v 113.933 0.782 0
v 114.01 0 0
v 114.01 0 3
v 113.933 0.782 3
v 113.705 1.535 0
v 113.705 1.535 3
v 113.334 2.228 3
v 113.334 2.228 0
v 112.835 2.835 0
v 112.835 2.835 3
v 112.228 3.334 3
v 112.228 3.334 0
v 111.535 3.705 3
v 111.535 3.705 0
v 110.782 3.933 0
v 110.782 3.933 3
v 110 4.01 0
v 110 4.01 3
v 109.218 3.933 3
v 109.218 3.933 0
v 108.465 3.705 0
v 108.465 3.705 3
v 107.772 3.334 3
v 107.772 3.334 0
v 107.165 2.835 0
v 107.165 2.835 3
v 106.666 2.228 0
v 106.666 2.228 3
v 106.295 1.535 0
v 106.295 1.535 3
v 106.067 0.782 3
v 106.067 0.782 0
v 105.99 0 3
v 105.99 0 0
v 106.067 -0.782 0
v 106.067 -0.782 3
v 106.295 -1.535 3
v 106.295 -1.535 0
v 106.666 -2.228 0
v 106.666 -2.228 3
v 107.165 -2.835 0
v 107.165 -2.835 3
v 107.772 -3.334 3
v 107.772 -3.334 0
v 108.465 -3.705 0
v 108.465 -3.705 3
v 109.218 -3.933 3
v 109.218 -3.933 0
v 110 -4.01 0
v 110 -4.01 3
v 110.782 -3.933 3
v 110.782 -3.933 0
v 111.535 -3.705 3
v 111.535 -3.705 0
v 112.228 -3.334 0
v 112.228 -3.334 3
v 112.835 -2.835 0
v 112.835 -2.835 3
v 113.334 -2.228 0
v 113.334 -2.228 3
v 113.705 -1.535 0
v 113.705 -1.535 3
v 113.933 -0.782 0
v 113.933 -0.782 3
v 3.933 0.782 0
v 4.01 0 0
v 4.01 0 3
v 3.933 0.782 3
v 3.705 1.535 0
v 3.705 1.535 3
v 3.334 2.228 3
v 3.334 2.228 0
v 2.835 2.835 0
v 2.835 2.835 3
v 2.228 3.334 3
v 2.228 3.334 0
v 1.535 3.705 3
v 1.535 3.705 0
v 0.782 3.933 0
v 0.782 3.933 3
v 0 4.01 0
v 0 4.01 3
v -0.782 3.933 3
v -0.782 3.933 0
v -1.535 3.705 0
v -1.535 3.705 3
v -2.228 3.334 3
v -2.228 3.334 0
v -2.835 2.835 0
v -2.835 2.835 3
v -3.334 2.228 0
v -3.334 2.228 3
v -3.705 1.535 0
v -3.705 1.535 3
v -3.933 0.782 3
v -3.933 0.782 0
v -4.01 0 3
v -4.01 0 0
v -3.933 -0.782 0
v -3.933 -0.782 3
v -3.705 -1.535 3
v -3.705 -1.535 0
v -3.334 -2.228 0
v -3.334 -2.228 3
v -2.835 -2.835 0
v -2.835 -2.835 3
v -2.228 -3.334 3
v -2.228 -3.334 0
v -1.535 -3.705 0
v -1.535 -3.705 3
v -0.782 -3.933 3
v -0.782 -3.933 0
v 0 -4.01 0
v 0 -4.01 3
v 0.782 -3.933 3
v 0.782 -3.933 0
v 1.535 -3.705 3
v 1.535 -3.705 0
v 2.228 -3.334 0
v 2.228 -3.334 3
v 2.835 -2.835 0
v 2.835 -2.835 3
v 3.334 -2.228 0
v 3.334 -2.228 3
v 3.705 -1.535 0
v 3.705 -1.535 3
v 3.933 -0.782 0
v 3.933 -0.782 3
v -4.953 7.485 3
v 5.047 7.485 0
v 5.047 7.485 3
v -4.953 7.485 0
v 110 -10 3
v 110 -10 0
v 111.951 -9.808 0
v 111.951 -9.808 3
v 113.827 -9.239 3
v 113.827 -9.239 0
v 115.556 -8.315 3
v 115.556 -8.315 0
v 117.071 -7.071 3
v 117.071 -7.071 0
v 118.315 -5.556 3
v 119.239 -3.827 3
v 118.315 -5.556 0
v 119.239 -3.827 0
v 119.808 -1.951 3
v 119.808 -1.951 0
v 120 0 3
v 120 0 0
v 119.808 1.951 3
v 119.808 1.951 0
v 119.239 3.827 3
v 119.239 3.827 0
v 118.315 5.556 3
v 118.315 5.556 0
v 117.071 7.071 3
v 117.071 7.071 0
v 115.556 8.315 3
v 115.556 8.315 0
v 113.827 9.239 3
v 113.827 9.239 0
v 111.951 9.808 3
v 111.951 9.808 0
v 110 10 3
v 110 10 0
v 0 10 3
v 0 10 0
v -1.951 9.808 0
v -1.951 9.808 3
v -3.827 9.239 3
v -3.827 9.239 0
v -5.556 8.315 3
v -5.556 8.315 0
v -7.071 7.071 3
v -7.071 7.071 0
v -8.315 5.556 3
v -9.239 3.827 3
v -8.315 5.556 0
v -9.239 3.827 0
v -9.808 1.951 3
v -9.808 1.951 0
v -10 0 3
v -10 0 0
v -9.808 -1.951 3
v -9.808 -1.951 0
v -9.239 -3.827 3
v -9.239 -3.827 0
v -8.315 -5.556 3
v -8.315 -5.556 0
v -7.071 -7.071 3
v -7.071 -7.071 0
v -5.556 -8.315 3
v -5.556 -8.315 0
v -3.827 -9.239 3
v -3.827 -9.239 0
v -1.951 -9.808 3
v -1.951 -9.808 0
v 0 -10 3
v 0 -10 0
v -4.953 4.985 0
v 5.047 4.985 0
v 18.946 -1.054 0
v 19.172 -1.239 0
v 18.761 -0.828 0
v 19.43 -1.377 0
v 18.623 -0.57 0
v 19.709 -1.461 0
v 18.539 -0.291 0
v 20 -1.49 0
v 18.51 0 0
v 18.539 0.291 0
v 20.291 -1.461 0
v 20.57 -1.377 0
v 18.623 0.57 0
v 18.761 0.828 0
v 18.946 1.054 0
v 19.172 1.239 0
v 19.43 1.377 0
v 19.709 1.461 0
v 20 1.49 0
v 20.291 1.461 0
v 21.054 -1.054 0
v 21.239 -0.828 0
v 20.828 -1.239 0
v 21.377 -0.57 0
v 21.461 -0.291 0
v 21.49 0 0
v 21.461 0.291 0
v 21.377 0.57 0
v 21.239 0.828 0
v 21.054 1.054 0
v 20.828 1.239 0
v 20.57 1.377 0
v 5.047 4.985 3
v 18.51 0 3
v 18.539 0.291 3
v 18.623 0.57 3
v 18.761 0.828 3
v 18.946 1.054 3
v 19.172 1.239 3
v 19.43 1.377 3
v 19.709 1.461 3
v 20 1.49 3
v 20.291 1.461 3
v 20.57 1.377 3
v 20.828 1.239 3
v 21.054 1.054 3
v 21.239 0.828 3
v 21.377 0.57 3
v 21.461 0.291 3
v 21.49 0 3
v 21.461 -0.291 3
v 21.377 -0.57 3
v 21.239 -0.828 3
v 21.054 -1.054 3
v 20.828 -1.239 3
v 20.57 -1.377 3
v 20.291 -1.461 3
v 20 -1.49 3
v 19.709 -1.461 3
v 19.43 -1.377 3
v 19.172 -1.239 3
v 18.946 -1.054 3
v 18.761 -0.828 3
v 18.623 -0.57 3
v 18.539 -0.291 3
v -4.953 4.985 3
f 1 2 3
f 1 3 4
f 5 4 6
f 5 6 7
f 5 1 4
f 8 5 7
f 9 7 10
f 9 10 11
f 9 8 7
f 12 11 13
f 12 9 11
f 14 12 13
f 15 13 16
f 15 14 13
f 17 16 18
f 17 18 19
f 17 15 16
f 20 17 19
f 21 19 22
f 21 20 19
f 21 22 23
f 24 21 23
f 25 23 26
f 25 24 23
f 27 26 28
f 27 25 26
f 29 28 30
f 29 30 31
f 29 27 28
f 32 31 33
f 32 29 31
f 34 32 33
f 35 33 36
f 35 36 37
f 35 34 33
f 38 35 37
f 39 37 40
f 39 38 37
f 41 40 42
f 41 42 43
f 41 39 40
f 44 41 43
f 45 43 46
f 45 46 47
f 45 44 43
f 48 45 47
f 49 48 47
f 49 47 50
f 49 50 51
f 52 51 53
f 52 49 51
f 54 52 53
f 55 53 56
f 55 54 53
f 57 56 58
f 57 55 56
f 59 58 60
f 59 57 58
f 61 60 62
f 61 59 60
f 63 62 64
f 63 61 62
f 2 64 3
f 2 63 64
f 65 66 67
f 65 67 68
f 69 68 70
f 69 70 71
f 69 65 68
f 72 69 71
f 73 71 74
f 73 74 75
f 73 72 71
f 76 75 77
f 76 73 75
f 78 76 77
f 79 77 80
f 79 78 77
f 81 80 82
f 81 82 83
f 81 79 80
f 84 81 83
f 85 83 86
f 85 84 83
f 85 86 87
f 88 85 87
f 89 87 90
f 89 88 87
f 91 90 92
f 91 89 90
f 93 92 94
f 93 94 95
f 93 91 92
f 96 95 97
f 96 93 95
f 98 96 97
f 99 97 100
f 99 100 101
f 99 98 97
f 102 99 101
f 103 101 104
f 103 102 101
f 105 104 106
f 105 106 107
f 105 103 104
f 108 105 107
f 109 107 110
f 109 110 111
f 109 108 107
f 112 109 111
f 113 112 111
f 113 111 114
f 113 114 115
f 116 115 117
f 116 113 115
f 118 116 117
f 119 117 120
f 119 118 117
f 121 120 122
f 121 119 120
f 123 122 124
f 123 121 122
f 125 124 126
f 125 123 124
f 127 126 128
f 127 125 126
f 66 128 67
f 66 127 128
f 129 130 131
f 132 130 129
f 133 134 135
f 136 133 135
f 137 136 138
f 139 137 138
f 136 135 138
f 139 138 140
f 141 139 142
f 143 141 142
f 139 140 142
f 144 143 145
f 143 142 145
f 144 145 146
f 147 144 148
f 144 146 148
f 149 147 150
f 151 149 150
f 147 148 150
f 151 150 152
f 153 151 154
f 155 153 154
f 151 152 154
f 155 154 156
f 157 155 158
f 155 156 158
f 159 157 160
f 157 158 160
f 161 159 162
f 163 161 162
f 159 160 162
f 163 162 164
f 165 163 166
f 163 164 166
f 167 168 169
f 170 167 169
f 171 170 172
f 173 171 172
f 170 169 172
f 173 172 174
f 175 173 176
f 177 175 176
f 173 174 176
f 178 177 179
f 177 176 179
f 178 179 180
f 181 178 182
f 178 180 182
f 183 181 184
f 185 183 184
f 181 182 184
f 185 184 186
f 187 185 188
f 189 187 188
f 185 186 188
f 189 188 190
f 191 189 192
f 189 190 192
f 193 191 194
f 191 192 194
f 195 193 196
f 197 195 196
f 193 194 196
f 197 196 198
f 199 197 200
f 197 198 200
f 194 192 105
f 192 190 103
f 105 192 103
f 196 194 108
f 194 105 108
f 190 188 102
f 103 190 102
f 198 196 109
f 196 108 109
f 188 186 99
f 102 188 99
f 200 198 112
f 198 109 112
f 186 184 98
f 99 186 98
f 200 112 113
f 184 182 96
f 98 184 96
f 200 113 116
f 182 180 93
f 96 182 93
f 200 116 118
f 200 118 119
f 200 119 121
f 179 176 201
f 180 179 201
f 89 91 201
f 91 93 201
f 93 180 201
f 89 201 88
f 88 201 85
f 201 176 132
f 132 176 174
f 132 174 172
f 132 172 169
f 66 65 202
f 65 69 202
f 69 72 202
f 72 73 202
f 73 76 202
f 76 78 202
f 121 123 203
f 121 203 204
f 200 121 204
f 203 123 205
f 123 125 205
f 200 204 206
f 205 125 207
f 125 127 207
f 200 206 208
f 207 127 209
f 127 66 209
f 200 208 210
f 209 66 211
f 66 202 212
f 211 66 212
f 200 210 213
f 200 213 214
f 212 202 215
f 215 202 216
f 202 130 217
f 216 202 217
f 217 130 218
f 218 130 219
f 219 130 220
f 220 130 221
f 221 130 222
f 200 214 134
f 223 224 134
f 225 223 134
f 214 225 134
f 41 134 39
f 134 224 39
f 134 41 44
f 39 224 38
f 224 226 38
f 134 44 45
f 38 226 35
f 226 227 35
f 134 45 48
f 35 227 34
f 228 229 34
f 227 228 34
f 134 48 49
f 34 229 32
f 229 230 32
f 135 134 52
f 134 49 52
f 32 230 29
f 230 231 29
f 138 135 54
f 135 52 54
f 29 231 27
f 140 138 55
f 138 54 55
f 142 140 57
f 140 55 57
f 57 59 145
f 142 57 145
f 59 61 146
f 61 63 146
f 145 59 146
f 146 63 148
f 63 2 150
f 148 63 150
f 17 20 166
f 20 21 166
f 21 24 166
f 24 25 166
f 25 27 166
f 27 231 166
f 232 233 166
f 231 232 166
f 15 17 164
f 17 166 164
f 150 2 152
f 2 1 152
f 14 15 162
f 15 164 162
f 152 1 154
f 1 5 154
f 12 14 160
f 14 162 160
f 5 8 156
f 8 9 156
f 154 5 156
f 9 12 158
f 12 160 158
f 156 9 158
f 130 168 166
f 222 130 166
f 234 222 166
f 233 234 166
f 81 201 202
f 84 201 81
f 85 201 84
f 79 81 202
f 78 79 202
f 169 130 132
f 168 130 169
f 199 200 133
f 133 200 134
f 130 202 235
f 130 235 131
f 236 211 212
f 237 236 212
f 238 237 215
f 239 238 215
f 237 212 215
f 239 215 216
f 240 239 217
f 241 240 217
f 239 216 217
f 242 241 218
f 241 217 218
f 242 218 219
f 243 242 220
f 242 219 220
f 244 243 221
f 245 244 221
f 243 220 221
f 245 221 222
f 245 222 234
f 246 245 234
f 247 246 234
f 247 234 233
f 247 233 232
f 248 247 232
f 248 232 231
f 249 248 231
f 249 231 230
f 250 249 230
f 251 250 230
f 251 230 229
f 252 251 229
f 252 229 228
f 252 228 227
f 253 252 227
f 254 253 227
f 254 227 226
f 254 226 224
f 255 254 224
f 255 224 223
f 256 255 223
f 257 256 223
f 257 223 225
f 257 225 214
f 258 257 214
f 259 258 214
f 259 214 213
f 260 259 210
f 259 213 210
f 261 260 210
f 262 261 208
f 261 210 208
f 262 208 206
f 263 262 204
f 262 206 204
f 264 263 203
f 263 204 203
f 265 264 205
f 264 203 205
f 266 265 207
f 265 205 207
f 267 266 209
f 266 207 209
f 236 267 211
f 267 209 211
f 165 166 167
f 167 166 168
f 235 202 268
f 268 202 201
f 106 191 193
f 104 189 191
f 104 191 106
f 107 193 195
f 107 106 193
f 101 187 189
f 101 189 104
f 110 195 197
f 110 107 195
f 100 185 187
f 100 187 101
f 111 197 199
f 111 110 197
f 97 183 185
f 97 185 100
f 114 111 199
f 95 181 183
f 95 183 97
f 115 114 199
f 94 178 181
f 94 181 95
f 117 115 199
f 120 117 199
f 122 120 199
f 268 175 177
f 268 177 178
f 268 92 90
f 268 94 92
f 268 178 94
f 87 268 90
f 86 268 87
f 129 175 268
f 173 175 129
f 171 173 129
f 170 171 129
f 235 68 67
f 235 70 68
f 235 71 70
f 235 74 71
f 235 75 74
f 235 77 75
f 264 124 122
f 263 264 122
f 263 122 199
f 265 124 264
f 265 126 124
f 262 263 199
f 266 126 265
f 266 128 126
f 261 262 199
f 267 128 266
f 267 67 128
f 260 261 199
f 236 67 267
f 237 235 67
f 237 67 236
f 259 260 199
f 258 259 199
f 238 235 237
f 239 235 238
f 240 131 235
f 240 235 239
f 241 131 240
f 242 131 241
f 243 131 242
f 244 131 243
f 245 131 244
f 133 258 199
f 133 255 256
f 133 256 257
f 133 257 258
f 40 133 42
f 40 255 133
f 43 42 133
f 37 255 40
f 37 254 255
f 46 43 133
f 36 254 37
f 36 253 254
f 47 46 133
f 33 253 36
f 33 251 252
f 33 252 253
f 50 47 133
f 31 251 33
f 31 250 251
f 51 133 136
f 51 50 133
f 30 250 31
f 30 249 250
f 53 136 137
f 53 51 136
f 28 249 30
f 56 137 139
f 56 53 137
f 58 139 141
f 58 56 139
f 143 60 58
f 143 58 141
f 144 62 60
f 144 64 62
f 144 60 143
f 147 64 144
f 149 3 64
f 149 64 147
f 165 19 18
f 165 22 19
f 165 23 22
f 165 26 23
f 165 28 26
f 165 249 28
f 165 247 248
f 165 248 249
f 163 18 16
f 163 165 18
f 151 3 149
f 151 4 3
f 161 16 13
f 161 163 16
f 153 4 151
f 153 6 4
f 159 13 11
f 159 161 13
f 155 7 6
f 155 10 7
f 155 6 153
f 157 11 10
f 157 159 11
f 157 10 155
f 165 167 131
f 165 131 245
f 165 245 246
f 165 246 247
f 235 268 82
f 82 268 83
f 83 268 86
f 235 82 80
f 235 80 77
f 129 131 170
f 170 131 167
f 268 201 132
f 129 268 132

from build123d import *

# Parameters (mm, degrees)
SKETCH1_R           = 4.01
BOSS_EXTRUDE1_DEPTH = 3
CUT_EXTRUDE2_REACH  = 122.453
SKETCH4_W           = 10
SKETCH4_H           = 2.5
SKETCH2_R           = 1.49
CUT_EXTRUDE3_DEPTH  = 10


with BuildPart() as part:
    # Sketch1 → Boss-Extrude1 (new body)
    with BuildSketch(Plane.XY):
        with BuildLine():
            Line((110, 10), (0, 10))
            ThreePointArc((0, 10), (-10, 0), (0, -10))
            Line((0, -10), (110, -10))
            ThreePointArc((110, -10), (120, 0), (110, 10))
        make_face()
        Circle(SKETCH1_R, mode=Mode.SUBTRACT)
        with Locations((110, 0)):
            Circle(SKETCH1_R, mode=Mode.SUBTRACT)
    extrude(amount=BOSS_EXTRUDE1_DEPTH)

    # Sketch4 → Cut-Extrude2 (cut, up to next)
    with BuildSketch(Plane(origin=(0, 0, 0), x_dir=(-1, 0, 0), z_dir=(0, 0, -1)), mode=Mode.PRIVATE) as cut_extrude2_sk1:
        with Locations((-0.046889456, 6.235161972)):
            Rectangle(SKETCH4_W, SKETCH4_H)
    cut_extrude2_tool1 = extrude(cut_extrude2_sk1.sketch, amount=-CUT_EXTRUDE2_REACH, mode=Mode.PRIVATE) & part.part
    add(cut_extrude2_tool1.solids().sort_by_distance((0.046889, 6.235162, 0))[0], mode=Mode.SUBTRACT)

    # Sketch2 → Cut-Extrude3 (cut)
    with BuildSketch(Plane(origin=(0, 0, 0), x_dir=(-1, 0, 0), z_dir=(0, 0, -1))):
        with Locations((-20, 0)):
            Circle(SKETCH2_R)
    extrude(amount=-CUT_EXTRUDE3_DEPTH, mode=Mode.SUBTRACT)


solid = part.part
